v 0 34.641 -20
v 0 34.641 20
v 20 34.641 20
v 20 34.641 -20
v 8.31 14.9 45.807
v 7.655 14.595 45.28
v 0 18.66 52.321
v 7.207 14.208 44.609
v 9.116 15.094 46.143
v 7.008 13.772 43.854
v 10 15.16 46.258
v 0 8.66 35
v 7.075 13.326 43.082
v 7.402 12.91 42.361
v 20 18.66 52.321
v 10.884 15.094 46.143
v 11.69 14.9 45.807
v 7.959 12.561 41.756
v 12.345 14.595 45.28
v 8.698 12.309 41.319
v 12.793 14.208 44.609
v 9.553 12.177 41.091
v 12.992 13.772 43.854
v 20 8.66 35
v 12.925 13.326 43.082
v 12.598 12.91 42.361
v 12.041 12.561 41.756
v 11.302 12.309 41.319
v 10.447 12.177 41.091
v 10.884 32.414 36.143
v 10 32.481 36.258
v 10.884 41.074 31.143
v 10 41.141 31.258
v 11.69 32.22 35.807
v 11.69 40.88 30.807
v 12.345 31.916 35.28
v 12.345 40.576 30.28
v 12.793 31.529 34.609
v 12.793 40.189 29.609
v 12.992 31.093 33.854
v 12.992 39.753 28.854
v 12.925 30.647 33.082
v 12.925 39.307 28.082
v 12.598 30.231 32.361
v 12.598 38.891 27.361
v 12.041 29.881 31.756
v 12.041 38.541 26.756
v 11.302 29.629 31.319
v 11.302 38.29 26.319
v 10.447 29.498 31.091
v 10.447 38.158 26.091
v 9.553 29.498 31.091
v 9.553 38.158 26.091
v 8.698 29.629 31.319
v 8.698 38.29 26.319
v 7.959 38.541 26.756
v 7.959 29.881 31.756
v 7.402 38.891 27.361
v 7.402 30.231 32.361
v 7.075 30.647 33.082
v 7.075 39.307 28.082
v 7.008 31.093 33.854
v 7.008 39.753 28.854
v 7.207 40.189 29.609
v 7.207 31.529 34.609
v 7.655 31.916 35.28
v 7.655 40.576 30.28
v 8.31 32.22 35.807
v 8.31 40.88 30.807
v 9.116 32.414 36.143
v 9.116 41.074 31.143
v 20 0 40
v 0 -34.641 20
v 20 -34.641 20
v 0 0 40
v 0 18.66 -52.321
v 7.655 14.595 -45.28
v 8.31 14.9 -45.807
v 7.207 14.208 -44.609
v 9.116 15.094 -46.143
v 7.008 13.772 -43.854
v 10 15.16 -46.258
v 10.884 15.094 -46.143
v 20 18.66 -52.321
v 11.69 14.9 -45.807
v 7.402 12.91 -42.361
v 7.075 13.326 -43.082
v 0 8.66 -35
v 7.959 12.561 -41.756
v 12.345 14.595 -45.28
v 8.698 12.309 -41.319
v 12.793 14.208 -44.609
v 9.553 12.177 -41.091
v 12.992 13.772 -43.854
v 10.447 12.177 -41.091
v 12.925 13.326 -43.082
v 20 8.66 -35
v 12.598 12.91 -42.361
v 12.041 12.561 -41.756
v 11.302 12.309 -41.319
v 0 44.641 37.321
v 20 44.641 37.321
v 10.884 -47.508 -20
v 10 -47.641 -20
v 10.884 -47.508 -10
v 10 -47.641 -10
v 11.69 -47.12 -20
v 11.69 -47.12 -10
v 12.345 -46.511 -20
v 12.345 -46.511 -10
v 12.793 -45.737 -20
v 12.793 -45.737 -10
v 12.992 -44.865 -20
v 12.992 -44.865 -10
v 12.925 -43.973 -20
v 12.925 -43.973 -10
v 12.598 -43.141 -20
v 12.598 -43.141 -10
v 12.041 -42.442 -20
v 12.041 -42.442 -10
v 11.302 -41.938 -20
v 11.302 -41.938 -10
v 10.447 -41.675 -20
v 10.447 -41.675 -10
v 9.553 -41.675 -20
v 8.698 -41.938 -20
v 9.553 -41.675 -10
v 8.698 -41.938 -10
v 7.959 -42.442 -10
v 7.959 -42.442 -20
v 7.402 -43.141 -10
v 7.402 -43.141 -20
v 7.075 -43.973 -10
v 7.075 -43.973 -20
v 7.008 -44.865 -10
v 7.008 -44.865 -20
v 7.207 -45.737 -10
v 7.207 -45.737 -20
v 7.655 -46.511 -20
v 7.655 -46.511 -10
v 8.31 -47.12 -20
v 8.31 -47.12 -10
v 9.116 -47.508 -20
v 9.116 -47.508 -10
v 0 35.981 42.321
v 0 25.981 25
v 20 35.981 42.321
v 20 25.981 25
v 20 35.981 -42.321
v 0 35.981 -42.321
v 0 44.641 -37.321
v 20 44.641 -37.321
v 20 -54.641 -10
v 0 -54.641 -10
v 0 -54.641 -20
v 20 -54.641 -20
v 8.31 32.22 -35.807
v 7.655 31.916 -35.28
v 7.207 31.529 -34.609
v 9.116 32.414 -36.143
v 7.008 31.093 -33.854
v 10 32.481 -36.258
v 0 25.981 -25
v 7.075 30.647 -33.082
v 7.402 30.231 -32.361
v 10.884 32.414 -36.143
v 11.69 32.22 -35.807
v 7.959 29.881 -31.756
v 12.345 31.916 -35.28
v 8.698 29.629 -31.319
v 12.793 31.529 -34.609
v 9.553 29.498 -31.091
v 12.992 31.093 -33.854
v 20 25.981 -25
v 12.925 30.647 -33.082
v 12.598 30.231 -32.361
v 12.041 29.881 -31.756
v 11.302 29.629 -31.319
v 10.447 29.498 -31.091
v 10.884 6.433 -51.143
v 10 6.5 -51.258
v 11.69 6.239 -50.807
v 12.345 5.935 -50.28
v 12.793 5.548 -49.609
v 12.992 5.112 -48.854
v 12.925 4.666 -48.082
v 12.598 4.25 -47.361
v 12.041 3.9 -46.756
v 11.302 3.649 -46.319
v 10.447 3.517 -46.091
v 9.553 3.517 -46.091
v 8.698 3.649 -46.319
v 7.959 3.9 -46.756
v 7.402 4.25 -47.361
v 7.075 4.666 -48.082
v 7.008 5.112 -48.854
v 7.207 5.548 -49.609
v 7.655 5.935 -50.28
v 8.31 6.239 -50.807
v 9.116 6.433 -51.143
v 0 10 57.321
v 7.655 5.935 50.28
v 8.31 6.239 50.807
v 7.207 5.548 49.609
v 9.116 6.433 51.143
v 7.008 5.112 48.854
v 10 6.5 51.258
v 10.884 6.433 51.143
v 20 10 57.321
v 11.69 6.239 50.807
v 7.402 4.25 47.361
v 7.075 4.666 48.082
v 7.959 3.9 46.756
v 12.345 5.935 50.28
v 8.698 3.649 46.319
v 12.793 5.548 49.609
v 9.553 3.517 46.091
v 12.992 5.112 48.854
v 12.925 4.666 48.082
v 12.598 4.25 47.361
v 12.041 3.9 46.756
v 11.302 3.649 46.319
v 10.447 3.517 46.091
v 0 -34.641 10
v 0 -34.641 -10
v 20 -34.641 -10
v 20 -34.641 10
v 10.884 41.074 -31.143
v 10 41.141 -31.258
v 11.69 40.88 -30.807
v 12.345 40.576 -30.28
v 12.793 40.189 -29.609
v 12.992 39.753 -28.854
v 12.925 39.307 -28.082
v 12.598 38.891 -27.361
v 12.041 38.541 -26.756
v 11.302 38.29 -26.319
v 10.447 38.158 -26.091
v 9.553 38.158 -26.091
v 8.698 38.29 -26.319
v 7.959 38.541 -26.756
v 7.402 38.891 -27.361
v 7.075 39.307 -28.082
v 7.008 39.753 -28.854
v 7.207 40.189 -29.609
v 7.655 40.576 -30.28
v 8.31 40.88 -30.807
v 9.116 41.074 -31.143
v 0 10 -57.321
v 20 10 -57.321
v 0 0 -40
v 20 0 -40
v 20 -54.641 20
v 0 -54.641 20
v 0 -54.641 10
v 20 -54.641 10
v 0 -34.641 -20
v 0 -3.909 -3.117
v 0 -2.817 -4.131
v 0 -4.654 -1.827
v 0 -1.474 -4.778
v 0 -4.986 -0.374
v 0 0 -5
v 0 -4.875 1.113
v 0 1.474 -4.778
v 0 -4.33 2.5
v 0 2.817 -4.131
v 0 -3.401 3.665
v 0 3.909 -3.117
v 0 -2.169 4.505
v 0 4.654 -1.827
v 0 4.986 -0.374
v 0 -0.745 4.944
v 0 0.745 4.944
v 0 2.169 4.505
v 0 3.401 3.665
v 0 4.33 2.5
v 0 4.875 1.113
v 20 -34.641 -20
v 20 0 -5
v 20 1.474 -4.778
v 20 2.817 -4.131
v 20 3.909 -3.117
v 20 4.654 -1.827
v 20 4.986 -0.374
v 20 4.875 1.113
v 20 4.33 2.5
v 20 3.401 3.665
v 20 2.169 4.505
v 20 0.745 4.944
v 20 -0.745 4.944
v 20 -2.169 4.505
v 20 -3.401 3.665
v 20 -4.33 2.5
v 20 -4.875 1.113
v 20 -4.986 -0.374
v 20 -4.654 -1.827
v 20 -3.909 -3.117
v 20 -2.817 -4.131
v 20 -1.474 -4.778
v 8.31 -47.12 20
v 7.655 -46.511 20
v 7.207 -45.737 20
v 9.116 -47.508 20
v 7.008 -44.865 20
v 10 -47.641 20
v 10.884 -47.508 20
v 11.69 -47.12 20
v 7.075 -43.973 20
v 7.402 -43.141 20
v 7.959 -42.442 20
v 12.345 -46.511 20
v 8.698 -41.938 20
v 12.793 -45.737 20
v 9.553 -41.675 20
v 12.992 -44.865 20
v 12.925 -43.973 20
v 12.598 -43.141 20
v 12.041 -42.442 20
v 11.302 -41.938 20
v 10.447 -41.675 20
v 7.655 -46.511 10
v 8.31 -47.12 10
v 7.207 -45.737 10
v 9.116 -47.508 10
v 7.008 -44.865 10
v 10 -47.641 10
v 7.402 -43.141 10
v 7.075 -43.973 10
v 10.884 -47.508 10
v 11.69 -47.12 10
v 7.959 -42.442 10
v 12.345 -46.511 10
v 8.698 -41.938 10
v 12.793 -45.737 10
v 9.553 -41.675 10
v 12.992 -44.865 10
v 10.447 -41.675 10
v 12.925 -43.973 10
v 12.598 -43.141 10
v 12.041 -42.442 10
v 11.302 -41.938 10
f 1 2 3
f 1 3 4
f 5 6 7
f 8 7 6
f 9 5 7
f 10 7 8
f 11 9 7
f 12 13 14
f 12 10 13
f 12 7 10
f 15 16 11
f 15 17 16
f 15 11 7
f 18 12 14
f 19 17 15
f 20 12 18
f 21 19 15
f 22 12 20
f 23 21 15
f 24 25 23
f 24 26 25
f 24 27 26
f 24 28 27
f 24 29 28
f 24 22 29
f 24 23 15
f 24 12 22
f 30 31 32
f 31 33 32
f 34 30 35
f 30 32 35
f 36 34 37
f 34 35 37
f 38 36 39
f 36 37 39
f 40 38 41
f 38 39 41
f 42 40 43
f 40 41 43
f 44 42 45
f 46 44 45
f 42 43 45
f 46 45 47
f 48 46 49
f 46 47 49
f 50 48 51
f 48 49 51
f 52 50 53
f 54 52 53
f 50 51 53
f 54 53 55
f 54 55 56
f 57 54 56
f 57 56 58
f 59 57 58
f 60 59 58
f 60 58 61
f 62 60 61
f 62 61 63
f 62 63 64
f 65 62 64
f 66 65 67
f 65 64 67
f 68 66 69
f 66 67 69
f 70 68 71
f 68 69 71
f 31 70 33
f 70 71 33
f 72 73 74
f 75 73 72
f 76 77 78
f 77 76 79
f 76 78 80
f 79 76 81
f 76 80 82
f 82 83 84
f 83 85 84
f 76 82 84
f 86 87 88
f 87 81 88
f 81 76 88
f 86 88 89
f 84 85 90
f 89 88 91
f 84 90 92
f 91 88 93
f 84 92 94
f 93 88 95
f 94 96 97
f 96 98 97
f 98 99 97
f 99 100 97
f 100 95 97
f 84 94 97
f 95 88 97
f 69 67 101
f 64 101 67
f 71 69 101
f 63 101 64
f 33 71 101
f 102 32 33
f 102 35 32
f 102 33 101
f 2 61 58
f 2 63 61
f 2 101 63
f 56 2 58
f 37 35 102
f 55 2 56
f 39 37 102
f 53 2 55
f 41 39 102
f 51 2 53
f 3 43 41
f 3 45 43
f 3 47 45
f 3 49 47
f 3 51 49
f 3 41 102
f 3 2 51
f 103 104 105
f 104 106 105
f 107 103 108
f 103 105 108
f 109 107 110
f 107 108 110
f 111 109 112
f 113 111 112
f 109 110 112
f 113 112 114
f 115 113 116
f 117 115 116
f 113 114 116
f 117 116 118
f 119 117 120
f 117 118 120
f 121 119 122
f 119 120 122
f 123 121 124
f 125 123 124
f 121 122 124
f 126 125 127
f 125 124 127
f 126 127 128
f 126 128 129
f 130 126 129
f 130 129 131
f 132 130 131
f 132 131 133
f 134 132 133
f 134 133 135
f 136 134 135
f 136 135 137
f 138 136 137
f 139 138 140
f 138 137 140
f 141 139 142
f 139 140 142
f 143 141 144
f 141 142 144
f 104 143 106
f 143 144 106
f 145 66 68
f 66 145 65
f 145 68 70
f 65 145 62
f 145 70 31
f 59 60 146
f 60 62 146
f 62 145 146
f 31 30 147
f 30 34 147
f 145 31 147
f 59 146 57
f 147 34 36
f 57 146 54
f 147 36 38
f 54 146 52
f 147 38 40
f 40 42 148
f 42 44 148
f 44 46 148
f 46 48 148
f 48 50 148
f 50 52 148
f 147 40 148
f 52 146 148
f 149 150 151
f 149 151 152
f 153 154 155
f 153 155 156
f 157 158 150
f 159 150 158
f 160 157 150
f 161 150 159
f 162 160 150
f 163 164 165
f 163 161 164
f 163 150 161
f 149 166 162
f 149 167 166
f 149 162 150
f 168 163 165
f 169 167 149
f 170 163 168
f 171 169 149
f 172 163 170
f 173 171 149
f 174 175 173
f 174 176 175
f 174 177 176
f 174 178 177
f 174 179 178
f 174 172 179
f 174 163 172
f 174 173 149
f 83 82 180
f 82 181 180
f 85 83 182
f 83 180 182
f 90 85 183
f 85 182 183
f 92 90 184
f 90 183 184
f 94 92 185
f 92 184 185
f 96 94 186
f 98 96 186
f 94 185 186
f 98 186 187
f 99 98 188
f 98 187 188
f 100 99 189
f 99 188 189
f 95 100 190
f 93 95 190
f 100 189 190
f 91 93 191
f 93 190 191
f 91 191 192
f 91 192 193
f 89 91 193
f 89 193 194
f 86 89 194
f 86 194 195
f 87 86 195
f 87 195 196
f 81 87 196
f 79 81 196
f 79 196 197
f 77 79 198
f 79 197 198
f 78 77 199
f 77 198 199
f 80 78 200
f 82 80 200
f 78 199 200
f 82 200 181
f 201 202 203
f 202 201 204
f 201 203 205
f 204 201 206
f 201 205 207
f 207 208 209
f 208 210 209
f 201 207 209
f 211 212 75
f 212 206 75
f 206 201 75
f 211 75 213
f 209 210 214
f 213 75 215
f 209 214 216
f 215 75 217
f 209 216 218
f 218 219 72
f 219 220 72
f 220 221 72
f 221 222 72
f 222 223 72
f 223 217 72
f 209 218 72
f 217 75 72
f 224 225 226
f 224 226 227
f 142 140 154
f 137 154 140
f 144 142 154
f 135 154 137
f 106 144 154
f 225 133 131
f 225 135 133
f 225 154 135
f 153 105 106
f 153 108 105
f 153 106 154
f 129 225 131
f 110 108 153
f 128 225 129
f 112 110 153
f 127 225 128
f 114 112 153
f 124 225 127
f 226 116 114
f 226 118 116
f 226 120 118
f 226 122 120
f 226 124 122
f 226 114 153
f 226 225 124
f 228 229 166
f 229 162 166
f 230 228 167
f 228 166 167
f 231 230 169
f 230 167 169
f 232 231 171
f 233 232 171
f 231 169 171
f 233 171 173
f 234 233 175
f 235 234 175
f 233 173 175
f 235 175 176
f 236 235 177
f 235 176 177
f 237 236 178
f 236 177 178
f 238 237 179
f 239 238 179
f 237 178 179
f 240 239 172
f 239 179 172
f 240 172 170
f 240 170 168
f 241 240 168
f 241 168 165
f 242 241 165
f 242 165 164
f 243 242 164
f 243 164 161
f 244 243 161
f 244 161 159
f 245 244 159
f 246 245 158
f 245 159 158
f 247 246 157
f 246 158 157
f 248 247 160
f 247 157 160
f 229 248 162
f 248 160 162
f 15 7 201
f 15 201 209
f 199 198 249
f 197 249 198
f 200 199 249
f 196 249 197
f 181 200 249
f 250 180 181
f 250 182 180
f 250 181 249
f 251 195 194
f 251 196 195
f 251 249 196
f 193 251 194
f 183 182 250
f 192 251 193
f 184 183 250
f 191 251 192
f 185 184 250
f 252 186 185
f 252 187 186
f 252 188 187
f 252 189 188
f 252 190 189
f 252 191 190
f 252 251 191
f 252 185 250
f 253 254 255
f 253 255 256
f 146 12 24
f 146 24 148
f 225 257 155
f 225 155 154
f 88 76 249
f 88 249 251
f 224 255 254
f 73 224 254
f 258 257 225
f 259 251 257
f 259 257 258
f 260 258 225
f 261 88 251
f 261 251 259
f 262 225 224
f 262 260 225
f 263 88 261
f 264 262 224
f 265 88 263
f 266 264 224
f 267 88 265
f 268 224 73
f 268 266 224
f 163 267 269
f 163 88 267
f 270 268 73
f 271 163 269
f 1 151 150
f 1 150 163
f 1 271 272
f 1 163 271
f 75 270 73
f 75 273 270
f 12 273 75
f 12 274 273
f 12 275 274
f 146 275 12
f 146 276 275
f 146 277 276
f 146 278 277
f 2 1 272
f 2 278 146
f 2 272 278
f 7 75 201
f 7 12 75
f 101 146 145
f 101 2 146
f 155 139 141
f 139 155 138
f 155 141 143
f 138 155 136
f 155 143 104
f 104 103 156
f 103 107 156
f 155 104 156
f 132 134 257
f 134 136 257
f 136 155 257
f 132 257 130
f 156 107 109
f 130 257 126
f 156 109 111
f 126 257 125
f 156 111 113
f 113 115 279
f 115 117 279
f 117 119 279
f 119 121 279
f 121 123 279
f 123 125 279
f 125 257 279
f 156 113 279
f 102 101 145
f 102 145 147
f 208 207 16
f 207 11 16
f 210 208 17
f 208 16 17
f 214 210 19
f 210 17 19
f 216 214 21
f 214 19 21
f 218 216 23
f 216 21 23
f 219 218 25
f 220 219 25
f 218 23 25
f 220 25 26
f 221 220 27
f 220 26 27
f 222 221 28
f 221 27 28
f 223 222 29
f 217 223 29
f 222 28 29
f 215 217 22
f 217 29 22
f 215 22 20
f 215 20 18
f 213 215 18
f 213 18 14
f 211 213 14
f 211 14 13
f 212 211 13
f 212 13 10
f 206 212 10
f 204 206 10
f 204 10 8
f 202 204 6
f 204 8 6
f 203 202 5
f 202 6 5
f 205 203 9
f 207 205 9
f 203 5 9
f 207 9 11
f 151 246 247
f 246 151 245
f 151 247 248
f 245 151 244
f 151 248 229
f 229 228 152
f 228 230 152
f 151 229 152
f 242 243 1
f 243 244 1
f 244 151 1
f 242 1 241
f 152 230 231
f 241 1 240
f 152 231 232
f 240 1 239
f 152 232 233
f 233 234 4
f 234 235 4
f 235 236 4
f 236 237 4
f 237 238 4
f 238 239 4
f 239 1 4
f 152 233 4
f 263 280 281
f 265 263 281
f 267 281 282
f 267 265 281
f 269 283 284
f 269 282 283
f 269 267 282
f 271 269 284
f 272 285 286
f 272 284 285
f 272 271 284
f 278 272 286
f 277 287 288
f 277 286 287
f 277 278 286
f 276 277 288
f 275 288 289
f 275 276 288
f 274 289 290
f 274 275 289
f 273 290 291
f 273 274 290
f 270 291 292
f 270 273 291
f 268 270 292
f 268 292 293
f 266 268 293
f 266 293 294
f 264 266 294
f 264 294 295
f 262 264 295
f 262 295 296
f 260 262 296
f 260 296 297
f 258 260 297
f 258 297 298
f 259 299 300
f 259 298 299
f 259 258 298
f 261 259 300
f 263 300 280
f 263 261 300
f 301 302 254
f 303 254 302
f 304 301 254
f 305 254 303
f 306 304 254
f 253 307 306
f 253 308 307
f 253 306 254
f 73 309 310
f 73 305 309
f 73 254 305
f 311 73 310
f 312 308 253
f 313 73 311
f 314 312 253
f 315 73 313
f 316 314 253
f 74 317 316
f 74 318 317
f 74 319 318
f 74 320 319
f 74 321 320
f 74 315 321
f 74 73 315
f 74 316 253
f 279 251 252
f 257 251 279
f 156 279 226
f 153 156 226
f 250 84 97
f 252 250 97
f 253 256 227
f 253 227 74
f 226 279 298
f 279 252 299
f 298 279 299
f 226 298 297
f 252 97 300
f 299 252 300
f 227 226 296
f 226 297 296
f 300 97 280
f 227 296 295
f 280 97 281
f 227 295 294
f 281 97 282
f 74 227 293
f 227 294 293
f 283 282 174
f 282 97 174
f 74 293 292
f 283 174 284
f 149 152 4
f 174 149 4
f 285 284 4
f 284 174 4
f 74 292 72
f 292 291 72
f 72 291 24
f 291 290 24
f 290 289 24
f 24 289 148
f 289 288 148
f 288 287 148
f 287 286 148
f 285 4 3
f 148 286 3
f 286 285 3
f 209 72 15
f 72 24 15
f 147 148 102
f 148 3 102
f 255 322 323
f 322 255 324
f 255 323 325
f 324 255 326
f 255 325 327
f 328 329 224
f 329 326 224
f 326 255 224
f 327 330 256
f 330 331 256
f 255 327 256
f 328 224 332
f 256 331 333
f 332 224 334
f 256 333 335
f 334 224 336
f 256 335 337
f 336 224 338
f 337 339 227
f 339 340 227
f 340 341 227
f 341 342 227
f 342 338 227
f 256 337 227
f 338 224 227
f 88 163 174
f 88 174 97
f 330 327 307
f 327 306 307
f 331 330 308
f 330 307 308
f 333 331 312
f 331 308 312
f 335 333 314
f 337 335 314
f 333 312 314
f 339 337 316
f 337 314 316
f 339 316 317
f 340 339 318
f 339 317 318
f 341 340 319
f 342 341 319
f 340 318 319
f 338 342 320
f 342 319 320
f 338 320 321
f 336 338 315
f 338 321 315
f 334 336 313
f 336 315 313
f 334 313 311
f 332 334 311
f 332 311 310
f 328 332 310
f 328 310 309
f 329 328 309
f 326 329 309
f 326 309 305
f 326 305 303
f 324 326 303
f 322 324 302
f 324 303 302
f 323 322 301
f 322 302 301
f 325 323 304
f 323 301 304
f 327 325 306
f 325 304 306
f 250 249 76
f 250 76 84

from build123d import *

# Parameters (mm, degrees)
EXTRUDE_1_DEPTH          = 20
SKETCH_2_W               = 20
SKETCH_2_H               = 10
EXTRUDE_2_DEPTH          = 20
SKETCH_3_W               = 20
SKETCH_3_H               = 10
EXTRUDE_3_DEPTH          = 20
SKETCH_4_R               = 3
CUT_EXTRUDE_1_DEPTH      = 88.361609461
CUT_EXTRUDE_2_DEPTH      = 76.355563624
CUT_EXTRUDE_2_DEPTH_BACK = 76.355563624
SKETCH_5_R               = 5
PATTERN_CIRCULAR_1_COUNT = 3


with BuildPart() as part:
    # 草图1 → 凸台-拉伸1 (new body)
    with BuildSketch(Plane(origin=(0, 0, 0), x_dir=(0, 0, -1), z_dir=(1, 0, 0))):
        Polygon((20, -34.641016151), (-20, -34.641016151), (-40, 0), (-20, 34.641016151), (20, 34.641016151), (40, 0), align=None)
    extrude(amount=EXTRUDE_1_DEPTH)

    # 草图2 → 凸台-拉伸2 (add)
    with BuildSketch(Plane(origin=(0, 17.320508076, 30), x_dir=(1, 0, 0), z_dir=(0, 0.500000000000003, 0.8660254037844369))):
        with Locations((10, 15)):
            Rectangle(SKETCH_2_W, SKETCH_2_H)
    extrude_2 = extrude(amount=EXTRUDE_2_DEPTH)

    # 草图3 → 凸台-拉伸3 (add)
    with BuildSketch(Plane(origin=(0, 17.320508076, 30), x_dir=(1, 0, 0), z_dir=(0, 0.500000000000003, 0.8660254037844369))):
        with Locations((10, -15)):
            Rectangle(SKETCH_3_W, SKETCH_3_H)
    extrude_3 = extrude(amount=EXTRUDE_3_DEPTH)

    # 草图4 → 切除-拉伸1 (cut, symmetric)
    with BuildSketch(Plane(origin=(0, 17.320508076, -10), x_dir=(1, 0, 0), z_dir=(0, 0.8660254037844369, -0.500000000000003))):
        with Locations(Location((10, -44.641016151, 0), (0, 0, 270))):
            Circle(SKETCH_4_R)
    cut_extrude_1 = extrude(amount=CUT_EXTRUDE_1_DEPTH, both=True, mode=Mode.SUBTRACT)

    # 草图5 → 切除-拉伸2 (cut, two sides: drawn at the far end of the back side and taken through both)
    with BuildSketch(Plane(origin=(20, 0, 0), x_dir=(0, 0, -1), z_dir=(1, 0, 0)).offset(-CUT_EXTRUDE_2_DEPTH_BACK)):
        Circle(SKETCH_5_R)
    extrude(amount=CUT_EXTRUDE_2_DEPTH + CUT_EXTRUDE_2_DEPTH_BACK, mode=Mode.SUBTRACT)

    # 阵列(圆周)1: 凸台-拉伸2, 凸台-拉伸3, 切除-拉伸1 ×3 about axis
    pattern_circular_1_axis = Axis((0, 0, 0), (1, 0, 0))
    add([extrude_2.rotate(pattern_circular_1_axis, i * 360 / PATTERN_CIRCULAR_1_COUNT) for i in range(1, PATTERN_CIRCULAR_1_COUNT)])
    add([extrude_3.rotate(pattern_circular_1_axis, i * 360 / PATTERN_CIRCULAR_1_COUNT) for i in range(1, PATTERN_CIRCULAR_1_COUNT)])
    add([cut_extrude_1.rotate(pattern_circular_1_axis, i * 360 / PATTERN_CIRCULAR_1_COUNT) for i in range(1, PATTERN_CIRCULAR_1_COUNT)], mode=Mode.SUBTRACT)


solid = part.part
